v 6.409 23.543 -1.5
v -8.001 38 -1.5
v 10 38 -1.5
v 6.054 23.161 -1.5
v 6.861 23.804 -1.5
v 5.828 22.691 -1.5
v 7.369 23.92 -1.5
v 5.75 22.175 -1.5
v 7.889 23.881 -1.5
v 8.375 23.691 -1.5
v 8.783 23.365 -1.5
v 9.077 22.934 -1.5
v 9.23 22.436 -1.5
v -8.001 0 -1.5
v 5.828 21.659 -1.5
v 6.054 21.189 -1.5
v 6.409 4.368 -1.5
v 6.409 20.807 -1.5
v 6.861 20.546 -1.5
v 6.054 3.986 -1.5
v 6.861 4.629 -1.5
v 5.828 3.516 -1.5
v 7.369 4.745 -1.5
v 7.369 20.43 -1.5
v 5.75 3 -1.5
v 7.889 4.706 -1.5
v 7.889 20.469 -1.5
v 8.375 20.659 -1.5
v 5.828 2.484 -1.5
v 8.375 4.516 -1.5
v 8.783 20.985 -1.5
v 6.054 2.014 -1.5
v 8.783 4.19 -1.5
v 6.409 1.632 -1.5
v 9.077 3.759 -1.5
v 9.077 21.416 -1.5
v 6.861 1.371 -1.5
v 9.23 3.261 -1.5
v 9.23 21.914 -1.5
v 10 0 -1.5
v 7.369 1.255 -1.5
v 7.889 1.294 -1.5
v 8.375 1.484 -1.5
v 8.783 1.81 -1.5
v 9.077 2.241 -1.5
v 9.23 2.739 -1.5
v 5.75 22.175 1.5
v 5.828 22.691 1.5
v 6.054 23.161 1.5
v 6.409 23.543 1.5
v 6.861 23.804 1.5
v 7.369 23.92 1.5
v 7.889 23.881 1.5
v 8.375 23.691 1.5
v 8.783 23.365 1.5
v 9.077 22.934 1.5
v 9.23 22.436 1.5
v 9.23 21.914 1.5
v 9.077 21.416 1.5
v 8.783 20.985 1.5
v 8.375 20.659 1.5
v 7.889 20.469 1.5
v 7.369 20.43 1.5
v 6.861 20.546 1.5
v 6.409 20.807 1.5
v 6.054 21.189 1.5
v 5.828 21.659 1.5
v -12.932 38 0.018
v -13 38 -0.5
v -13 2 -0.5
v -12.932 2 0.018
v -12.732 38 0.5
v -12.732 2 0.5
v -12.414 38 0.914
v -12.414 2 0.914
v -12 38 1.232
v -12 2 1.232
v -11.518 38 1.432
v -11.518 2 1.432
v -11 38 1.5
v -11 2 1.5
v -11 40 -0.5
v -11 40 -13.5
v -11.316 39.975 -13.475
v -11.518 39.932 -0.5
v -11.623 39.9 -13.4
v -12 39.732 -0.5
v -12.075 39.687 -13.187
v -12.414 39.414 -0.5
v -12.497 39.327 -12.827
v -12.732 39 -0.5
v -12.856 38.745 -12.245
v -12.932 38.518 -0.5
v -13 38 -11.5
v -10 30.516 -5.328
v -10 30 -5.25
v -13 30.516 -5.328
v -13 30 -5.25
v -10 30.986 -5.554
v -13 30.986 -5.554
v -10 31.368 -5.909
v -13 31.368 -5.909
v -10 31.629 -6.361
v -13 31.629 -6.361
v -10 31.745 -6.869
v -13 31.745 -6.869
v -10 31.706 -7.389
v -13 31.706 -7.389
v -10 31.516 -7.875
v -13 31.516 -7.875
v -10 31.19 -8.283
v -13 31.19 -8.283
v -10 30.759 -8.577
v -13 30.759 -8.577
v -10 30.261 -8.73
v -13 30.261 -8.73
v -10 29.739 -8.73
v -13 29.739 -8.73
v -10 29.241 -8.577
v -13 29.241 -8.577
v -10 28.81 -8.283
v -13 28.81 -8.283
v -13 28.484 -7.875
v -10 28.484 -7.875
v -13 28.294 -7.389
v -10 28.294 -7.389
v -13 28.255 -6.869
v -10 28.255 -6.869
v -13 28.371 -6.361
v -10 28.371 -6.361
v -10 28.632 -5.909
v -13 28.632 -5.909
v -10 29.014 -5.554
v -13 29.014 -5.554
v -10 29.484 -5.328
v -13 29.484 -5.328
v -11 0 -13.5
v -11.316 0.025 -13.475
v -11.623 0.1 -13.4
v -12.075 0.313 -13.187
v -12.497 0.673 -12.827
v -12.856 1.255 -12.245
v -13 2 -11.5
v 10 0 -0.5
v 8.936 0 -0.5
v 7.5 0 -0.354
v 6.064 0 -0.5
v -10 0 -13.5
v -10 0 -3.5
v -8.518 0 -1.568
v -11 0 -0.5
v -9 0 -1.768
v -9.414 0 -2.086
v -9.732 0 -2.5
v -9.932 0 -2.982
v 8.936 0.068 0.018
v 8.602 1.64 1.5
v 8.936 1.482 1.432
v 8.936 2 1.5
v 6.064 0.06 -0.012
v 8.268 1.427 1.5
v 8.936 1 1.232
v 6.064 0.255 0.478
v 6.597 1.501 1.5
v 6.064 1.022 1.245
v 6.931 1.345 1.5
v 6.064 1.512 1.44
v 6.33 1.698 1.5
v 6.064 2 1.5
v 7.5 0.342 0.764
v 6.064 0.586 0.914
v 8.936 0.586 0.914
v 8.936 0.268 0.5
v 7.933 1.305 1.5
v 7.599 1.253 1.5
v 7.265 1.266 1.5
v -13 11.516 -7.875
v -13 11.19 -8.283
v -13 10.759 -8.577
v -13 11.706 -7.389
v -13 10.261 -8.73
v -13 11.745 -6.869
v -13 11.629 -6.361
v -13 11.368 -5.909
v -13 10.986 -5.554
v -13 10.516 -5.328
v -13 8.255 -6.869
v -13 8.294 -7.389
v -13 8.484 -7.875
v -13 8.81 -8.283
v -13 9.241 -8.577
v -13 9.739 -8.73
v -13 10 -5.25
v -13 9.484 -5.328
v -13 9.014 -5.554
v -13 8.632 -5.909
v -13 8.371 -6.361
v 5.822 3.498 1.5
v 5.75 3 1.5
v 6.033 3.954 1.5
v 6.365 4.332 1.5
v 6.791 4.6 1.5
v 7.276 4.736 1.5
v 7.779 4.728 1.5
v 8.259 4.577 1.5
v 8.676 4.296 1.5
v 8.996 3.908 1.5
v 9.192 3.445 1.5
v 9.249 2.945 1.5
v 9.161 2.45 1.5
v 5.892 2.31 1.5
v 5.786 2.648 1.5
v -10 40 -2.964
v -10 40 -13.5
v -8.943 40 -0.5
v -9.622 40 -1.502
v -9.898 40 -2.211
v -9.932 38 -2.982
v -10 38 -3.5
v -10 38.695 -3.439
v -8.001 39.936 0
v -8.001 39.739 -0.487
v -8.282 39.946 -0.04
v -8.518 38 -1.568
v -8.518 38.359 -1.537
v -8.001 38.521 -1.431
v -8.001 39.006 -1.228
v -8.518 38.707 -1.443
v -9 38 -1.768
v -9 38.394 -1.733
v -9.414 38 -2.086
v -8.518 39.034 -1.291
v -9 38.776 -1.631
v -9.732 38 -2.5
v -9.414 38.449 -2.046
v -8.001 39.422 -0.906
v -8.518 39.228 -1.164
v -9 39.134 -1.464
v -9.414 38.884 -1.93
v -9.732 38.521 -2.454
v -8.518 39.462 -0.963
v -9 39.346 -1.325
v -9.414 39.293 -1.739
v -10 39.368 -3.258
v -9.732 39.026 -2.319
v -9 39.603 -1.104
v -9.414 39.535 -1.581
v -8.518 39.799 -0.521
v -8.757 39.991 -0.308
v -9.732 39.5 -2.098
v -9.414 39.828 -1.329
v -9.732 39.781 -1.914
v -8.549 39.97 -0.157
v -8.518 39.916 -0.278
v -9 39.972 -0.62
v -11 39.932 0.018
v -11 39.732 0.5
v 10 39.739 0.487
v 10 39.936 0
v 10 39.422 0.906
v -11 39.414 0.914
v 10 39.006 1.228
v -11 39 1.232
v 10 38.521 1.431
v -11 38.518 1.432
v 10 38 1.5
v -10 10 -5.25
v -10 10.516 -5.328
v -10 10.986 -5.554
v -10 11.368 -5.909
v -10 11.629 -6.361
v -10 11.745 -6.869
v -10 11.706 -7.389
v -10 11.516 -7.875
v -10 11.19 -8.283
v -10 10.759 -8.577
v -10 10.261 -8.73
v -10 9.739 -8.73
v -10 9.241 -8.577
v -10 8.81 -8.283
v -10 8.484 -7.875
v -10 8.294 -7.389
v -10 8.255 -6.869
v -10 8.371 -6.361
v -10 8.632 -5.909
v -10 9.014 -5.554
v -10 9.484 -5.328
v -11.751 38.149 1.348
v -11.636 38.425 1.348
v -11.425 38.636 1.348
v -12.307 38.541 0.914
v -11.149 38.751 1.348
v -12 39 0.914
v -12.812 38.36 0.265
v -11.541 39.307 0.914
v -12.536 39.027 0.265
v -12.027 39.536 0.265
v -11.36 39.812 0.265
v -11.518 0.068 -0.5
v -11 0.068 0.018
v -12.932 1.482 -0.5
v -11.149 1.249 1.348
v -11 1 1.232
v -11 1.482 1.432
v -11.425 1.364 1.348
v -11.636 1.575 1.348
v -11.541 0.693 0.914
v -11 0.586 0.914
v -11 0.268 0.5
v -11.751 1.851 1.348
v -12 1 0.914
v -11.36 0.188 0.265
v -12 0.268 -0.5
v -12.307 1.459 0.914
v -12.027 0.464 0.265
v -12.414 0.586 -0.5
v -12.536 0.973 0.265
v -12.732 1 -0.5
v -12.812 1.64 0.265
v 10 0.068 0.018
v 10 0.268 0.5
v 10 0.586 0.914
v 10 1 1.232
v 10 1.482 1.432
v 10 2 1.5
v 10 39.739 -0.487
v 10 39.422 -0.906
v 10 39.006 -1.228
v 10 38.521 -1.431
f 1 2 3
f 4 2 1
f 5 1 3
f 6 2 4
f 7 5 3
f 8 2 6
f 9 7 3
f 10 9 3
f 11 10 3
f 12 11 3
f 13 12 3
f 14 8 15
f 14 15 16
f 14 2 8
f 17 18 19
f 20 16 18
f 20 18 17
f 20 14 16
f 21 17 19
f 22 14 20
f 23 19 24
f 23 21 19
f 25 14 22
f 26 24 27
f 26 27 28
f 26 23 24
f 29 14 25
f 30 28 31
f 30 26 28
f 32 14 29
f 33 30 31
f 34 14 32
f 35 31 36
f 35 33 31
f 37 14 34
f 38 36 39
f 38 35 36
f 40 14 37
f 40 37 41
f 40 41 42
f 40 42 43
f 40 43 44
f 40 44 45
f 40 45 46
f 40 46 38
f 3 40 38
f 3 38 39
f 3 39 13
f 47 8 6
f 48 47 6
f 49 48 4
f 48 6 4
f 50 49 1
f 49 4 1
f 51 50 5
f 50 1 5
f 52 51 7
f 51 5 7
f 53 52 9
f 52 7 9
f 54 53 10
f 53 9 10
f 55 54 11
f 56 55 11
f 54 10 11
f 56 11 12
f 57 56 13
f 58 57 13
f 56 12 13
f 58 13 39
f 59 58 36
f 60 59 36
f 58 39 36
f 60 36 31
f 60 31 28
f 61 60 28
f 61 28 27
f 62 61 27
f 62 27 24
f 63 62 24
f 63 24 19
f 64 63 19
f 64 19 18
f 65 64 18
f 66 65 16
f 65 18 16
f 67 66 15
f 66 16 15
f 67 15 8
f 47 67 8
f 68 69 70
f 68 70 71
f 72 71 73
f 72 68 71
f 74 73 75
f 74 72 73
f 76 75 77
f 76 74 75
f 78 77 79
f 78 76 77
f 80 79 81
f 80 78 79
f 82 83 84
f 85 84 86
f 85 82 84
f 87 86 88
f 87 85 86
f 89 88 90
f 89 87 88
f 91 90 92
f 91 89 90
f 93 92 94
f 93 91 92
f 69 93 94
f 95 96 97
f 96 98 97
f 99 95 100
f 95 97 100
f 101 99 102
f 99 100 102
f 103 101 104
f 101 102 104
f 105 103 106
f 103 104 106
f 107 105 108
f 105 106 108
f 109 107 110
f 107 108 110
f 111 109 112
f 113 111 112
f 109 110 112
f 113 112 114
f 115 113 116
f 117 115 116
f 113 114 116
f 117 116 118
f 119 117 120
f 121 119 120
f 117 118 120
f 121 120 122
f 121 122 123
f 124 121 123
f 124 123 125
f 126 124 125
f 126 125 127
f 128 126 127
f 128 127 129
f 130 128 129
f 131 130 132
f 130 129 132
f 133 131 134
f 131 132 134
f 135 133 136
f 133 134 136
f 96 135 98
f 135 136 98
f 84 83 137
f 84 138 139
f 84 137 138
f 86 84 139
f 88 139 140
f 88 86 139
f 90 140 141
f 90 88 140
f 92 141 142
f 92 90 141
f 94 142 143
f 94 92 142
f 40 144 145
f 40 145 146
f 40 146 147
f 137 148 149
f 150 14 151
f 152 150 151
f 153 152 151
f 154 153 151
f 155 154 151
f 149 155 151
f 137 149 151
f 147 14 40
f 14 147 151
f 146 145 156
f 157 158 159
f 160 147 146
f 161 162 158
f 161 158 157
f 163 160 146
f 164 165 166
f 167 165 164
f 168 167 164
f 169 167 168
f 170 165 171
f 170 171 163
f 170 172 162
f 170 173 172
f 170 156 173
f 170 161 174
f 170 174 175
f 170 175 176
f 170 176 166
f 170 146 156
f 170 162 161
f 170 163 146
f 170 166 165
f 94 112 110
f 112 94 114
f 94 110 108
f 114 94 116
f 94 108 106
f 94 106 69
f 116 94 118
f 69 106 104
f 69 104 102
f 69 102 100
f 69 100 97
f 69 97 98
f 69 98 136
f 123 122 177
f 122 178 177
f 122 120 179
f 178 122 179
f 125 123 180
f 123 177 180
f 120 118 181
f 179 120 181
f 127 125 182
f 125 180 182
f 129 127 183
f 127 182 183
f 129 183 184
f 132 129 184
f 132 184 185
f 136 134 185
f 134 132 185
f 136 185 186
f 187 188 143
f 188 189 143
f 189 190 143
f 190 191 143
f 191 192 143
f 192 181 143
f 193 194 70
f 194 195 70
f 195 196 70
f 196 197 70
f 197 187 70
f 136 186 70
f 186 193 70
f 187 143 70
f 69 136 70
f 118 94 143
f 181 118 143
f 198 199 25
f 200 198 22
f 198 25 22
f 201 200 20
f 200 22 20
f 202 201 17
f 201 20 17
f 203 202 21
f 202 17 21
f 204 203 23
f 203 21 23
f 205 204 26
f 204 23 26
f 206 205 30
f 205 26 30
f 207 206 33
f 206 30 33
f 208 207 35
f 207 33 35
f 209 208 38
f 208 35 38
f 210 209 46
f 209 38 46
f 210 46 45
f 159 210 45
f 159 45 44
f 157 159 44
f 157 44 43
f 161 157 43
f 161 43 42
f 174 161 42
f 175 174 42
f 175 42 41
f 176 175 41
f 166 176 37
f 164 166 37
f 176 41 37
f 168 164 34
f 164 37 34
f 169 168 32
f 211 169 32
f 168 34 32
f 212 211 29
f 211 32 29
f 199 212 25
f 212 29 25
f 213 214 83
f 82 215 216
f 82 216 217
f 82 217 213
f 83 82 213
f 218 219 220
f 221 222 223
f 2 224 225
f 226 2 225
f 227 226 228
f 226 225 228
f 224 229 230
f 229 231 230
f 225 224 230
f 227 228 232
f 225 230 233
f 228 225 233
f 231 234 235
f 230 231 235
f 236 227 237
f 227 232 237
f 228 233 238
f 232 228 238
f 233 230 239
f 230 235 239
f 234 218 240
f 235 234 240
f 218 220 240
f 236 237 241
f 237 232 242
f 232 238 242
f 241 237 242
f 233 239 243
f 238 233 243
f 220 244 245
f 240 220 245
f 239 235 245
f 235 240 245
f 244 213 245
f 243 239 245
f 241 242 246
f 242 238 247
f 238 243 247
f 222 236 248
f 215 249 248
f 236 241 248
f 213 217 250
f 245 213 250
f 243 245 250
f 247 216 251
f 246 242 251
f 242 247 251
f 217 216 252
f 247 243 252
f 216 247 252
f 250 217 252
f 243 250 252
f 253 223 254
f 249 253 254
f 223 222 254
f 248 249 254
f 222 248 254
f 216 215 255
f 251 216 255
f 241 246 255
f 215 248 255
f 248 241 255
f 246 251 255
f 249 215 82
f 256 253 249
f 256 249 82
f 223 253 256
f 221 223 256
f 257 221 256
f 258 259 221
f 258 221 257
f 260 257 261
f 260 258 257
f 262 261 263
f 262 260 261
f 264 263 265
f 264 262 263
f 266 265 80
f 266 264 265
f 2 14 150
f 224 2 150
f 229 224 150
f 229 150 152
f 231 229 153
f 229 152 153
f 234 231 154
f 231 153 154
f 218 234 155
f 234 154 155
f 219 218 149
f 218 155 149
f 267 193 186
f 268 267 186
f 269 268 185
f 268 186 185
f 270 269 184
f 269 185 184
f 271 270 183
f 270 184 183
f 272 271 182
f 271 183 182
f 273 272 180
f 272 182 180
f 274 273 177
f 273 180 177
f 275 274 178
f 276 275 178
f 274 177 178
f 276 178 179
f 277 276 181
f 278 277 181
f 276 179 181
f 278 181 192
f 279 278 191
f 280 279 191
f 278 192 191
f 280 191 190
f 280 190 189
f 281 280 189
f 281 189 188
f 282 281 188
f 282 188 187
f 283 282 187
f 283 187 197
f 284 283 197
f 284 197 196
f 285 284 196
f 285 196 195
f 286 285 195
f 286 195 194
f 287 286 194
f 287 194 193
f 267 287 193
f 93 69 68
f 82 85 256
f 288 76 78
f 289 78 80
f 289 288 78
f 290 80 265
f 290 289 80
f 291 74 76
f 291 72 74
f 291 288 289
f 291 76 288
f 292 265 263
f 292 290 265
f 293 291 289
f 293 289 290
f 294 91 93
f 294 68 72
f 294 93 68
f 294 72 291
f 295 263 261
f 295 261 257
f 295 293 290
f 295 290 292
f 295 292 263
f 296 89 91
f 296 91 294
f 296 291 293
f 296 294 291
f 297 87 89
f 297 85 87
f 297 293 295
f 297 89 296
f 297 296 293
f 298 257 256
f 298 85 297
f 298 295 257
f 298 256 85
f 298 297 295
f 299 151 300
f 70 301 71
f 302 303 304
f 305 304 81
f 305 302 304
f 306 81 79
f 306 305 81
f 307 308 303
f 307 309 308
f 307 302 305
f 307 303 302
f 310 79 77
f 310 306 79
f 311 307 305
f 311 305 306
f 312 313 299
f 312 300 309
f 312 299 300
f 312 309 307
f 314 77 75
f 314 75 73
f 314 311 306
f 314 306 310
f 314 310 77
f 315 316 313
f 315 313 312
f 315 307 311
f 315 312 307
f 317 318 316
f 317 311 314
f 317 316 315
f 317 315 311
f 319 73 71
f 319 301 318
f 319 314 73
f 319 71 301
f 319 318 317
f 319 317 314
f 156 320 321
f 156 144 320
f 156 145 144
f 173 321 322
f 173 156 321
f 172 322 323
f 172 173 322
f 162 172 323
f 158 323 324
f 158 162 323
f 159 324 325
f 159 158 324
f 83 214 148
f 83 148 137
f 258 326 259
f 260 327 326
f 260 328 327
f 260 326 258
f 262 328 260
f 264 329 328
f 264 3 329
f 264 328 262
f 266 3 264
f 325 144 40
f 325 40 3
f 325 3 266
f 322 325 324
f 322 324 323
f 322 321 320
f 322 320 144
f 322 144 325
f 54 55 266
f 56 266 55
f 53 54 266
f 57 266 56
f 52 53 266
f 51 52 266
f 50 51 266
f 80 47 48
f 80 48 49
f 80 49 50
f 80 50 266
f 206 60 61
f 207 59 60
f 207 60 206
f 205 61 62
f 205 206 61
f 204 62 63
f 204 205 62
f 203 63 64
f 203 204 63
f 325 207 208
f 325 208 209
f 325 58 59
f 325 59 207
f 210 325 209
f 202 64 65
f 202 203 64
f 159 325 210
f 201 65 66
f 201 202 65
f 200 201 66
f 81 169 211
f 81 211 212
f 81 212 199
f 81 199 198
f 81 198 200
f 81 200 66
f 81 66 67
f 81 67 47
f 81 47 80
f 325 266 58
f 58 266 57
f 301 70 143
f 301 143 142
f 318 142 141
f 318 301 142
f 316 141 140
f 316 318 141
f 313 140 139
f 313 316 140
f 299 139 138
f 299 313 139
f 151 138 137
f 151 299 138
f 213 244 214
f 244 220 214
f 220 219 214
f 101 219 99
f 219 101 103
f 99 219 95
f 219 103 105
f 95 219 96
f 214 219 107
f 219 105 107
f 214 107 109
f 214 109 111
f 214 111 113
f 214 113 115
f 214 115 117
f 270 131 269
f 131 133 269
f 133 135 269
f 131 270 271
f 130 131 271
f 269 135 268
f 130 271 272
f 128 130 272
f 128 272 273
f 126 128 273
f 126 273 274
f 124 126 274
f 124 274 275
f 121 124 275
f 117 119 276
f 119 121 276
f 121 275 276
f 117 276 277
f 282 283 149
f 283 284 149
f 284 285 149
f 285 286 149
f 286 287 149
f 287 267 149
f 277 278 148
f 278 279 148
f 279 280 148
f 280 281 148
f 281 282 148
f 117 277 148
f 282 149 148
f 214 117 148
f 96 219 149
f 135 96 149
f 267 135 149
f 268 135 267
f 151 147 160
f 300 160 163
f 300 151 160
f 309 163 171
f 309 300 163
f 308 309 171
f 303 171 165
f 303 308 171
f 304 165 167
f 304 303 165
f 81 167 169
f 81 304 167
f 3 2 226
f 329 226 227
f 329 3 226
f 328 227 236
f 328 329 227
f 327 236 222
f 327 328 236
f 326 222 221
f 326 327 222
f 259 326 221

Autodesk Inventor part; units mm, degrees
ref_plane "YZ Plane" through (0, 0, 0) normal (1, 0, 0) x (0, 1, 0)
ref_plane "XZ Plane" through (0, 0, 0) normal (0, 1, 0) x (-1, 0, 0)
ref_plane "XY Plane" through (0, 0, 0) normal (0, 0, 1) x (1, 0, 0)
sketch "Sketch1" plane through (0, 0, 0) normal (0, 1, 0) x (-1, 0, 0)
  line L0 (-10, 1.5) -> (10, 1.5)
  line L1 (10, 1.5) -> (10, -1.5)
  line L2 (10, -1.5) -> (-10, -1.5)
  line L3 (-10, -1.5) -> (-10, 1.5)
  line L4 (-10, 1.5) -> (10, -1.5) construction
  line L5 (10, 1.5) -> (-10, -1.5) construction
  line L6 (10, 1.5) -> (10, -13.5)
  line L7 (10, -13.5) -> (13, -13.5)
  line L8 (13, -13.5) -> (13, 1.5)
  line L9 (13, 1.5) -> (10, 1.5)
  point P0 (0, 0)
  dimension "d0" = 20
  dimension "d1" = 3
  dimension "d2" = 15
  dimension "d3" = 3
extrude "Extrusion1" add sketch "Sketch1" along normal blind 40
sketch "Sketch2" plane through (10, 0, -1.5) normal (0, 0, -1) x (-1, 0, 0)
  line L0 (0, 0) -> (23, 0) projected
  line L1 (0, 0) -> (2.5, 0)
  line L2 (2.5, 0) -> (2.5, 3)
  line L3 (2.5, 0) -> (5.5, 0) construction
  circle A0 centre (2.5, 3) radius 1.75
  line L4 (2.5, 3) -> (2.5, 22.175)
  line L5 (2.5, 3) -> (21.675, 3) construction
  circle A1 centre (2.5, 22.175) radius 1.75
  point P0 (10, 0)
  dimension "d6" = 2.5
  dimension "d7" = 3
  dimension "d8" = 90
  dimension "d9" = 3.5
  dimension "d10" = 19.175
  dimension "d11" = 90
  dimension "d12" = 3.5
extrude "Extrusion2" cut sketch "Sketch2" against normal blind 3
fillet "Fillet1" radius 2 3 edges at (-13, 20, -13.5) (-13, 0, -6) (-13, 40, -6)
fillet "Fillet2" radius 2 4 edges at (0, 40, -1.5) (-13, 20, 1.5) (-0.5, 0, 1.5) (-0.5, 40, 1.5)
fillet "Fillet3" radius 2 2 edges at (-10, 39.2247, -1.0811) (-10, 19, -1.5)
sketch "Sketch3" plane through (-13, 2, -11.5) normal (-1, 0, 0) x (0, 0, 1)
  line L0 (-2, -2) -> (-2, 38) projected
  line L1 (-2, -2) -> (-2, 18)
  line L2 (-2, 18) -> (4.5, 18)
  line L3 (-2, -2) -> (11, -2) projected
  line L4 (4.5, 18) -> (4.5, 8)
  line L5 (4.5, 18) -> (14.5, 18) construction
  line L6 (4.5, 18) -> (4.5, 28)
  line L7 (4.5, 18) -> (14.5, 18) construction
  circle A0 centre (4.5, 8) radius 1.75
  circle A1 centre (4.5, 28) radius 1.75
  point P0 (11.5, -2)
  dimension "d18" = 10
  dimension "d19" = 90
  dimension "d20" = 6.5
  dimension "d21" = 10
  dimension "d22" = 90
  dimension "d23" = 3.5
  dimension "d24" = 3.5
extrude "Extrusion3" cut sketch "Sketch3" against normal blind 3
properties part number "Limit_Switch_Bracket"
